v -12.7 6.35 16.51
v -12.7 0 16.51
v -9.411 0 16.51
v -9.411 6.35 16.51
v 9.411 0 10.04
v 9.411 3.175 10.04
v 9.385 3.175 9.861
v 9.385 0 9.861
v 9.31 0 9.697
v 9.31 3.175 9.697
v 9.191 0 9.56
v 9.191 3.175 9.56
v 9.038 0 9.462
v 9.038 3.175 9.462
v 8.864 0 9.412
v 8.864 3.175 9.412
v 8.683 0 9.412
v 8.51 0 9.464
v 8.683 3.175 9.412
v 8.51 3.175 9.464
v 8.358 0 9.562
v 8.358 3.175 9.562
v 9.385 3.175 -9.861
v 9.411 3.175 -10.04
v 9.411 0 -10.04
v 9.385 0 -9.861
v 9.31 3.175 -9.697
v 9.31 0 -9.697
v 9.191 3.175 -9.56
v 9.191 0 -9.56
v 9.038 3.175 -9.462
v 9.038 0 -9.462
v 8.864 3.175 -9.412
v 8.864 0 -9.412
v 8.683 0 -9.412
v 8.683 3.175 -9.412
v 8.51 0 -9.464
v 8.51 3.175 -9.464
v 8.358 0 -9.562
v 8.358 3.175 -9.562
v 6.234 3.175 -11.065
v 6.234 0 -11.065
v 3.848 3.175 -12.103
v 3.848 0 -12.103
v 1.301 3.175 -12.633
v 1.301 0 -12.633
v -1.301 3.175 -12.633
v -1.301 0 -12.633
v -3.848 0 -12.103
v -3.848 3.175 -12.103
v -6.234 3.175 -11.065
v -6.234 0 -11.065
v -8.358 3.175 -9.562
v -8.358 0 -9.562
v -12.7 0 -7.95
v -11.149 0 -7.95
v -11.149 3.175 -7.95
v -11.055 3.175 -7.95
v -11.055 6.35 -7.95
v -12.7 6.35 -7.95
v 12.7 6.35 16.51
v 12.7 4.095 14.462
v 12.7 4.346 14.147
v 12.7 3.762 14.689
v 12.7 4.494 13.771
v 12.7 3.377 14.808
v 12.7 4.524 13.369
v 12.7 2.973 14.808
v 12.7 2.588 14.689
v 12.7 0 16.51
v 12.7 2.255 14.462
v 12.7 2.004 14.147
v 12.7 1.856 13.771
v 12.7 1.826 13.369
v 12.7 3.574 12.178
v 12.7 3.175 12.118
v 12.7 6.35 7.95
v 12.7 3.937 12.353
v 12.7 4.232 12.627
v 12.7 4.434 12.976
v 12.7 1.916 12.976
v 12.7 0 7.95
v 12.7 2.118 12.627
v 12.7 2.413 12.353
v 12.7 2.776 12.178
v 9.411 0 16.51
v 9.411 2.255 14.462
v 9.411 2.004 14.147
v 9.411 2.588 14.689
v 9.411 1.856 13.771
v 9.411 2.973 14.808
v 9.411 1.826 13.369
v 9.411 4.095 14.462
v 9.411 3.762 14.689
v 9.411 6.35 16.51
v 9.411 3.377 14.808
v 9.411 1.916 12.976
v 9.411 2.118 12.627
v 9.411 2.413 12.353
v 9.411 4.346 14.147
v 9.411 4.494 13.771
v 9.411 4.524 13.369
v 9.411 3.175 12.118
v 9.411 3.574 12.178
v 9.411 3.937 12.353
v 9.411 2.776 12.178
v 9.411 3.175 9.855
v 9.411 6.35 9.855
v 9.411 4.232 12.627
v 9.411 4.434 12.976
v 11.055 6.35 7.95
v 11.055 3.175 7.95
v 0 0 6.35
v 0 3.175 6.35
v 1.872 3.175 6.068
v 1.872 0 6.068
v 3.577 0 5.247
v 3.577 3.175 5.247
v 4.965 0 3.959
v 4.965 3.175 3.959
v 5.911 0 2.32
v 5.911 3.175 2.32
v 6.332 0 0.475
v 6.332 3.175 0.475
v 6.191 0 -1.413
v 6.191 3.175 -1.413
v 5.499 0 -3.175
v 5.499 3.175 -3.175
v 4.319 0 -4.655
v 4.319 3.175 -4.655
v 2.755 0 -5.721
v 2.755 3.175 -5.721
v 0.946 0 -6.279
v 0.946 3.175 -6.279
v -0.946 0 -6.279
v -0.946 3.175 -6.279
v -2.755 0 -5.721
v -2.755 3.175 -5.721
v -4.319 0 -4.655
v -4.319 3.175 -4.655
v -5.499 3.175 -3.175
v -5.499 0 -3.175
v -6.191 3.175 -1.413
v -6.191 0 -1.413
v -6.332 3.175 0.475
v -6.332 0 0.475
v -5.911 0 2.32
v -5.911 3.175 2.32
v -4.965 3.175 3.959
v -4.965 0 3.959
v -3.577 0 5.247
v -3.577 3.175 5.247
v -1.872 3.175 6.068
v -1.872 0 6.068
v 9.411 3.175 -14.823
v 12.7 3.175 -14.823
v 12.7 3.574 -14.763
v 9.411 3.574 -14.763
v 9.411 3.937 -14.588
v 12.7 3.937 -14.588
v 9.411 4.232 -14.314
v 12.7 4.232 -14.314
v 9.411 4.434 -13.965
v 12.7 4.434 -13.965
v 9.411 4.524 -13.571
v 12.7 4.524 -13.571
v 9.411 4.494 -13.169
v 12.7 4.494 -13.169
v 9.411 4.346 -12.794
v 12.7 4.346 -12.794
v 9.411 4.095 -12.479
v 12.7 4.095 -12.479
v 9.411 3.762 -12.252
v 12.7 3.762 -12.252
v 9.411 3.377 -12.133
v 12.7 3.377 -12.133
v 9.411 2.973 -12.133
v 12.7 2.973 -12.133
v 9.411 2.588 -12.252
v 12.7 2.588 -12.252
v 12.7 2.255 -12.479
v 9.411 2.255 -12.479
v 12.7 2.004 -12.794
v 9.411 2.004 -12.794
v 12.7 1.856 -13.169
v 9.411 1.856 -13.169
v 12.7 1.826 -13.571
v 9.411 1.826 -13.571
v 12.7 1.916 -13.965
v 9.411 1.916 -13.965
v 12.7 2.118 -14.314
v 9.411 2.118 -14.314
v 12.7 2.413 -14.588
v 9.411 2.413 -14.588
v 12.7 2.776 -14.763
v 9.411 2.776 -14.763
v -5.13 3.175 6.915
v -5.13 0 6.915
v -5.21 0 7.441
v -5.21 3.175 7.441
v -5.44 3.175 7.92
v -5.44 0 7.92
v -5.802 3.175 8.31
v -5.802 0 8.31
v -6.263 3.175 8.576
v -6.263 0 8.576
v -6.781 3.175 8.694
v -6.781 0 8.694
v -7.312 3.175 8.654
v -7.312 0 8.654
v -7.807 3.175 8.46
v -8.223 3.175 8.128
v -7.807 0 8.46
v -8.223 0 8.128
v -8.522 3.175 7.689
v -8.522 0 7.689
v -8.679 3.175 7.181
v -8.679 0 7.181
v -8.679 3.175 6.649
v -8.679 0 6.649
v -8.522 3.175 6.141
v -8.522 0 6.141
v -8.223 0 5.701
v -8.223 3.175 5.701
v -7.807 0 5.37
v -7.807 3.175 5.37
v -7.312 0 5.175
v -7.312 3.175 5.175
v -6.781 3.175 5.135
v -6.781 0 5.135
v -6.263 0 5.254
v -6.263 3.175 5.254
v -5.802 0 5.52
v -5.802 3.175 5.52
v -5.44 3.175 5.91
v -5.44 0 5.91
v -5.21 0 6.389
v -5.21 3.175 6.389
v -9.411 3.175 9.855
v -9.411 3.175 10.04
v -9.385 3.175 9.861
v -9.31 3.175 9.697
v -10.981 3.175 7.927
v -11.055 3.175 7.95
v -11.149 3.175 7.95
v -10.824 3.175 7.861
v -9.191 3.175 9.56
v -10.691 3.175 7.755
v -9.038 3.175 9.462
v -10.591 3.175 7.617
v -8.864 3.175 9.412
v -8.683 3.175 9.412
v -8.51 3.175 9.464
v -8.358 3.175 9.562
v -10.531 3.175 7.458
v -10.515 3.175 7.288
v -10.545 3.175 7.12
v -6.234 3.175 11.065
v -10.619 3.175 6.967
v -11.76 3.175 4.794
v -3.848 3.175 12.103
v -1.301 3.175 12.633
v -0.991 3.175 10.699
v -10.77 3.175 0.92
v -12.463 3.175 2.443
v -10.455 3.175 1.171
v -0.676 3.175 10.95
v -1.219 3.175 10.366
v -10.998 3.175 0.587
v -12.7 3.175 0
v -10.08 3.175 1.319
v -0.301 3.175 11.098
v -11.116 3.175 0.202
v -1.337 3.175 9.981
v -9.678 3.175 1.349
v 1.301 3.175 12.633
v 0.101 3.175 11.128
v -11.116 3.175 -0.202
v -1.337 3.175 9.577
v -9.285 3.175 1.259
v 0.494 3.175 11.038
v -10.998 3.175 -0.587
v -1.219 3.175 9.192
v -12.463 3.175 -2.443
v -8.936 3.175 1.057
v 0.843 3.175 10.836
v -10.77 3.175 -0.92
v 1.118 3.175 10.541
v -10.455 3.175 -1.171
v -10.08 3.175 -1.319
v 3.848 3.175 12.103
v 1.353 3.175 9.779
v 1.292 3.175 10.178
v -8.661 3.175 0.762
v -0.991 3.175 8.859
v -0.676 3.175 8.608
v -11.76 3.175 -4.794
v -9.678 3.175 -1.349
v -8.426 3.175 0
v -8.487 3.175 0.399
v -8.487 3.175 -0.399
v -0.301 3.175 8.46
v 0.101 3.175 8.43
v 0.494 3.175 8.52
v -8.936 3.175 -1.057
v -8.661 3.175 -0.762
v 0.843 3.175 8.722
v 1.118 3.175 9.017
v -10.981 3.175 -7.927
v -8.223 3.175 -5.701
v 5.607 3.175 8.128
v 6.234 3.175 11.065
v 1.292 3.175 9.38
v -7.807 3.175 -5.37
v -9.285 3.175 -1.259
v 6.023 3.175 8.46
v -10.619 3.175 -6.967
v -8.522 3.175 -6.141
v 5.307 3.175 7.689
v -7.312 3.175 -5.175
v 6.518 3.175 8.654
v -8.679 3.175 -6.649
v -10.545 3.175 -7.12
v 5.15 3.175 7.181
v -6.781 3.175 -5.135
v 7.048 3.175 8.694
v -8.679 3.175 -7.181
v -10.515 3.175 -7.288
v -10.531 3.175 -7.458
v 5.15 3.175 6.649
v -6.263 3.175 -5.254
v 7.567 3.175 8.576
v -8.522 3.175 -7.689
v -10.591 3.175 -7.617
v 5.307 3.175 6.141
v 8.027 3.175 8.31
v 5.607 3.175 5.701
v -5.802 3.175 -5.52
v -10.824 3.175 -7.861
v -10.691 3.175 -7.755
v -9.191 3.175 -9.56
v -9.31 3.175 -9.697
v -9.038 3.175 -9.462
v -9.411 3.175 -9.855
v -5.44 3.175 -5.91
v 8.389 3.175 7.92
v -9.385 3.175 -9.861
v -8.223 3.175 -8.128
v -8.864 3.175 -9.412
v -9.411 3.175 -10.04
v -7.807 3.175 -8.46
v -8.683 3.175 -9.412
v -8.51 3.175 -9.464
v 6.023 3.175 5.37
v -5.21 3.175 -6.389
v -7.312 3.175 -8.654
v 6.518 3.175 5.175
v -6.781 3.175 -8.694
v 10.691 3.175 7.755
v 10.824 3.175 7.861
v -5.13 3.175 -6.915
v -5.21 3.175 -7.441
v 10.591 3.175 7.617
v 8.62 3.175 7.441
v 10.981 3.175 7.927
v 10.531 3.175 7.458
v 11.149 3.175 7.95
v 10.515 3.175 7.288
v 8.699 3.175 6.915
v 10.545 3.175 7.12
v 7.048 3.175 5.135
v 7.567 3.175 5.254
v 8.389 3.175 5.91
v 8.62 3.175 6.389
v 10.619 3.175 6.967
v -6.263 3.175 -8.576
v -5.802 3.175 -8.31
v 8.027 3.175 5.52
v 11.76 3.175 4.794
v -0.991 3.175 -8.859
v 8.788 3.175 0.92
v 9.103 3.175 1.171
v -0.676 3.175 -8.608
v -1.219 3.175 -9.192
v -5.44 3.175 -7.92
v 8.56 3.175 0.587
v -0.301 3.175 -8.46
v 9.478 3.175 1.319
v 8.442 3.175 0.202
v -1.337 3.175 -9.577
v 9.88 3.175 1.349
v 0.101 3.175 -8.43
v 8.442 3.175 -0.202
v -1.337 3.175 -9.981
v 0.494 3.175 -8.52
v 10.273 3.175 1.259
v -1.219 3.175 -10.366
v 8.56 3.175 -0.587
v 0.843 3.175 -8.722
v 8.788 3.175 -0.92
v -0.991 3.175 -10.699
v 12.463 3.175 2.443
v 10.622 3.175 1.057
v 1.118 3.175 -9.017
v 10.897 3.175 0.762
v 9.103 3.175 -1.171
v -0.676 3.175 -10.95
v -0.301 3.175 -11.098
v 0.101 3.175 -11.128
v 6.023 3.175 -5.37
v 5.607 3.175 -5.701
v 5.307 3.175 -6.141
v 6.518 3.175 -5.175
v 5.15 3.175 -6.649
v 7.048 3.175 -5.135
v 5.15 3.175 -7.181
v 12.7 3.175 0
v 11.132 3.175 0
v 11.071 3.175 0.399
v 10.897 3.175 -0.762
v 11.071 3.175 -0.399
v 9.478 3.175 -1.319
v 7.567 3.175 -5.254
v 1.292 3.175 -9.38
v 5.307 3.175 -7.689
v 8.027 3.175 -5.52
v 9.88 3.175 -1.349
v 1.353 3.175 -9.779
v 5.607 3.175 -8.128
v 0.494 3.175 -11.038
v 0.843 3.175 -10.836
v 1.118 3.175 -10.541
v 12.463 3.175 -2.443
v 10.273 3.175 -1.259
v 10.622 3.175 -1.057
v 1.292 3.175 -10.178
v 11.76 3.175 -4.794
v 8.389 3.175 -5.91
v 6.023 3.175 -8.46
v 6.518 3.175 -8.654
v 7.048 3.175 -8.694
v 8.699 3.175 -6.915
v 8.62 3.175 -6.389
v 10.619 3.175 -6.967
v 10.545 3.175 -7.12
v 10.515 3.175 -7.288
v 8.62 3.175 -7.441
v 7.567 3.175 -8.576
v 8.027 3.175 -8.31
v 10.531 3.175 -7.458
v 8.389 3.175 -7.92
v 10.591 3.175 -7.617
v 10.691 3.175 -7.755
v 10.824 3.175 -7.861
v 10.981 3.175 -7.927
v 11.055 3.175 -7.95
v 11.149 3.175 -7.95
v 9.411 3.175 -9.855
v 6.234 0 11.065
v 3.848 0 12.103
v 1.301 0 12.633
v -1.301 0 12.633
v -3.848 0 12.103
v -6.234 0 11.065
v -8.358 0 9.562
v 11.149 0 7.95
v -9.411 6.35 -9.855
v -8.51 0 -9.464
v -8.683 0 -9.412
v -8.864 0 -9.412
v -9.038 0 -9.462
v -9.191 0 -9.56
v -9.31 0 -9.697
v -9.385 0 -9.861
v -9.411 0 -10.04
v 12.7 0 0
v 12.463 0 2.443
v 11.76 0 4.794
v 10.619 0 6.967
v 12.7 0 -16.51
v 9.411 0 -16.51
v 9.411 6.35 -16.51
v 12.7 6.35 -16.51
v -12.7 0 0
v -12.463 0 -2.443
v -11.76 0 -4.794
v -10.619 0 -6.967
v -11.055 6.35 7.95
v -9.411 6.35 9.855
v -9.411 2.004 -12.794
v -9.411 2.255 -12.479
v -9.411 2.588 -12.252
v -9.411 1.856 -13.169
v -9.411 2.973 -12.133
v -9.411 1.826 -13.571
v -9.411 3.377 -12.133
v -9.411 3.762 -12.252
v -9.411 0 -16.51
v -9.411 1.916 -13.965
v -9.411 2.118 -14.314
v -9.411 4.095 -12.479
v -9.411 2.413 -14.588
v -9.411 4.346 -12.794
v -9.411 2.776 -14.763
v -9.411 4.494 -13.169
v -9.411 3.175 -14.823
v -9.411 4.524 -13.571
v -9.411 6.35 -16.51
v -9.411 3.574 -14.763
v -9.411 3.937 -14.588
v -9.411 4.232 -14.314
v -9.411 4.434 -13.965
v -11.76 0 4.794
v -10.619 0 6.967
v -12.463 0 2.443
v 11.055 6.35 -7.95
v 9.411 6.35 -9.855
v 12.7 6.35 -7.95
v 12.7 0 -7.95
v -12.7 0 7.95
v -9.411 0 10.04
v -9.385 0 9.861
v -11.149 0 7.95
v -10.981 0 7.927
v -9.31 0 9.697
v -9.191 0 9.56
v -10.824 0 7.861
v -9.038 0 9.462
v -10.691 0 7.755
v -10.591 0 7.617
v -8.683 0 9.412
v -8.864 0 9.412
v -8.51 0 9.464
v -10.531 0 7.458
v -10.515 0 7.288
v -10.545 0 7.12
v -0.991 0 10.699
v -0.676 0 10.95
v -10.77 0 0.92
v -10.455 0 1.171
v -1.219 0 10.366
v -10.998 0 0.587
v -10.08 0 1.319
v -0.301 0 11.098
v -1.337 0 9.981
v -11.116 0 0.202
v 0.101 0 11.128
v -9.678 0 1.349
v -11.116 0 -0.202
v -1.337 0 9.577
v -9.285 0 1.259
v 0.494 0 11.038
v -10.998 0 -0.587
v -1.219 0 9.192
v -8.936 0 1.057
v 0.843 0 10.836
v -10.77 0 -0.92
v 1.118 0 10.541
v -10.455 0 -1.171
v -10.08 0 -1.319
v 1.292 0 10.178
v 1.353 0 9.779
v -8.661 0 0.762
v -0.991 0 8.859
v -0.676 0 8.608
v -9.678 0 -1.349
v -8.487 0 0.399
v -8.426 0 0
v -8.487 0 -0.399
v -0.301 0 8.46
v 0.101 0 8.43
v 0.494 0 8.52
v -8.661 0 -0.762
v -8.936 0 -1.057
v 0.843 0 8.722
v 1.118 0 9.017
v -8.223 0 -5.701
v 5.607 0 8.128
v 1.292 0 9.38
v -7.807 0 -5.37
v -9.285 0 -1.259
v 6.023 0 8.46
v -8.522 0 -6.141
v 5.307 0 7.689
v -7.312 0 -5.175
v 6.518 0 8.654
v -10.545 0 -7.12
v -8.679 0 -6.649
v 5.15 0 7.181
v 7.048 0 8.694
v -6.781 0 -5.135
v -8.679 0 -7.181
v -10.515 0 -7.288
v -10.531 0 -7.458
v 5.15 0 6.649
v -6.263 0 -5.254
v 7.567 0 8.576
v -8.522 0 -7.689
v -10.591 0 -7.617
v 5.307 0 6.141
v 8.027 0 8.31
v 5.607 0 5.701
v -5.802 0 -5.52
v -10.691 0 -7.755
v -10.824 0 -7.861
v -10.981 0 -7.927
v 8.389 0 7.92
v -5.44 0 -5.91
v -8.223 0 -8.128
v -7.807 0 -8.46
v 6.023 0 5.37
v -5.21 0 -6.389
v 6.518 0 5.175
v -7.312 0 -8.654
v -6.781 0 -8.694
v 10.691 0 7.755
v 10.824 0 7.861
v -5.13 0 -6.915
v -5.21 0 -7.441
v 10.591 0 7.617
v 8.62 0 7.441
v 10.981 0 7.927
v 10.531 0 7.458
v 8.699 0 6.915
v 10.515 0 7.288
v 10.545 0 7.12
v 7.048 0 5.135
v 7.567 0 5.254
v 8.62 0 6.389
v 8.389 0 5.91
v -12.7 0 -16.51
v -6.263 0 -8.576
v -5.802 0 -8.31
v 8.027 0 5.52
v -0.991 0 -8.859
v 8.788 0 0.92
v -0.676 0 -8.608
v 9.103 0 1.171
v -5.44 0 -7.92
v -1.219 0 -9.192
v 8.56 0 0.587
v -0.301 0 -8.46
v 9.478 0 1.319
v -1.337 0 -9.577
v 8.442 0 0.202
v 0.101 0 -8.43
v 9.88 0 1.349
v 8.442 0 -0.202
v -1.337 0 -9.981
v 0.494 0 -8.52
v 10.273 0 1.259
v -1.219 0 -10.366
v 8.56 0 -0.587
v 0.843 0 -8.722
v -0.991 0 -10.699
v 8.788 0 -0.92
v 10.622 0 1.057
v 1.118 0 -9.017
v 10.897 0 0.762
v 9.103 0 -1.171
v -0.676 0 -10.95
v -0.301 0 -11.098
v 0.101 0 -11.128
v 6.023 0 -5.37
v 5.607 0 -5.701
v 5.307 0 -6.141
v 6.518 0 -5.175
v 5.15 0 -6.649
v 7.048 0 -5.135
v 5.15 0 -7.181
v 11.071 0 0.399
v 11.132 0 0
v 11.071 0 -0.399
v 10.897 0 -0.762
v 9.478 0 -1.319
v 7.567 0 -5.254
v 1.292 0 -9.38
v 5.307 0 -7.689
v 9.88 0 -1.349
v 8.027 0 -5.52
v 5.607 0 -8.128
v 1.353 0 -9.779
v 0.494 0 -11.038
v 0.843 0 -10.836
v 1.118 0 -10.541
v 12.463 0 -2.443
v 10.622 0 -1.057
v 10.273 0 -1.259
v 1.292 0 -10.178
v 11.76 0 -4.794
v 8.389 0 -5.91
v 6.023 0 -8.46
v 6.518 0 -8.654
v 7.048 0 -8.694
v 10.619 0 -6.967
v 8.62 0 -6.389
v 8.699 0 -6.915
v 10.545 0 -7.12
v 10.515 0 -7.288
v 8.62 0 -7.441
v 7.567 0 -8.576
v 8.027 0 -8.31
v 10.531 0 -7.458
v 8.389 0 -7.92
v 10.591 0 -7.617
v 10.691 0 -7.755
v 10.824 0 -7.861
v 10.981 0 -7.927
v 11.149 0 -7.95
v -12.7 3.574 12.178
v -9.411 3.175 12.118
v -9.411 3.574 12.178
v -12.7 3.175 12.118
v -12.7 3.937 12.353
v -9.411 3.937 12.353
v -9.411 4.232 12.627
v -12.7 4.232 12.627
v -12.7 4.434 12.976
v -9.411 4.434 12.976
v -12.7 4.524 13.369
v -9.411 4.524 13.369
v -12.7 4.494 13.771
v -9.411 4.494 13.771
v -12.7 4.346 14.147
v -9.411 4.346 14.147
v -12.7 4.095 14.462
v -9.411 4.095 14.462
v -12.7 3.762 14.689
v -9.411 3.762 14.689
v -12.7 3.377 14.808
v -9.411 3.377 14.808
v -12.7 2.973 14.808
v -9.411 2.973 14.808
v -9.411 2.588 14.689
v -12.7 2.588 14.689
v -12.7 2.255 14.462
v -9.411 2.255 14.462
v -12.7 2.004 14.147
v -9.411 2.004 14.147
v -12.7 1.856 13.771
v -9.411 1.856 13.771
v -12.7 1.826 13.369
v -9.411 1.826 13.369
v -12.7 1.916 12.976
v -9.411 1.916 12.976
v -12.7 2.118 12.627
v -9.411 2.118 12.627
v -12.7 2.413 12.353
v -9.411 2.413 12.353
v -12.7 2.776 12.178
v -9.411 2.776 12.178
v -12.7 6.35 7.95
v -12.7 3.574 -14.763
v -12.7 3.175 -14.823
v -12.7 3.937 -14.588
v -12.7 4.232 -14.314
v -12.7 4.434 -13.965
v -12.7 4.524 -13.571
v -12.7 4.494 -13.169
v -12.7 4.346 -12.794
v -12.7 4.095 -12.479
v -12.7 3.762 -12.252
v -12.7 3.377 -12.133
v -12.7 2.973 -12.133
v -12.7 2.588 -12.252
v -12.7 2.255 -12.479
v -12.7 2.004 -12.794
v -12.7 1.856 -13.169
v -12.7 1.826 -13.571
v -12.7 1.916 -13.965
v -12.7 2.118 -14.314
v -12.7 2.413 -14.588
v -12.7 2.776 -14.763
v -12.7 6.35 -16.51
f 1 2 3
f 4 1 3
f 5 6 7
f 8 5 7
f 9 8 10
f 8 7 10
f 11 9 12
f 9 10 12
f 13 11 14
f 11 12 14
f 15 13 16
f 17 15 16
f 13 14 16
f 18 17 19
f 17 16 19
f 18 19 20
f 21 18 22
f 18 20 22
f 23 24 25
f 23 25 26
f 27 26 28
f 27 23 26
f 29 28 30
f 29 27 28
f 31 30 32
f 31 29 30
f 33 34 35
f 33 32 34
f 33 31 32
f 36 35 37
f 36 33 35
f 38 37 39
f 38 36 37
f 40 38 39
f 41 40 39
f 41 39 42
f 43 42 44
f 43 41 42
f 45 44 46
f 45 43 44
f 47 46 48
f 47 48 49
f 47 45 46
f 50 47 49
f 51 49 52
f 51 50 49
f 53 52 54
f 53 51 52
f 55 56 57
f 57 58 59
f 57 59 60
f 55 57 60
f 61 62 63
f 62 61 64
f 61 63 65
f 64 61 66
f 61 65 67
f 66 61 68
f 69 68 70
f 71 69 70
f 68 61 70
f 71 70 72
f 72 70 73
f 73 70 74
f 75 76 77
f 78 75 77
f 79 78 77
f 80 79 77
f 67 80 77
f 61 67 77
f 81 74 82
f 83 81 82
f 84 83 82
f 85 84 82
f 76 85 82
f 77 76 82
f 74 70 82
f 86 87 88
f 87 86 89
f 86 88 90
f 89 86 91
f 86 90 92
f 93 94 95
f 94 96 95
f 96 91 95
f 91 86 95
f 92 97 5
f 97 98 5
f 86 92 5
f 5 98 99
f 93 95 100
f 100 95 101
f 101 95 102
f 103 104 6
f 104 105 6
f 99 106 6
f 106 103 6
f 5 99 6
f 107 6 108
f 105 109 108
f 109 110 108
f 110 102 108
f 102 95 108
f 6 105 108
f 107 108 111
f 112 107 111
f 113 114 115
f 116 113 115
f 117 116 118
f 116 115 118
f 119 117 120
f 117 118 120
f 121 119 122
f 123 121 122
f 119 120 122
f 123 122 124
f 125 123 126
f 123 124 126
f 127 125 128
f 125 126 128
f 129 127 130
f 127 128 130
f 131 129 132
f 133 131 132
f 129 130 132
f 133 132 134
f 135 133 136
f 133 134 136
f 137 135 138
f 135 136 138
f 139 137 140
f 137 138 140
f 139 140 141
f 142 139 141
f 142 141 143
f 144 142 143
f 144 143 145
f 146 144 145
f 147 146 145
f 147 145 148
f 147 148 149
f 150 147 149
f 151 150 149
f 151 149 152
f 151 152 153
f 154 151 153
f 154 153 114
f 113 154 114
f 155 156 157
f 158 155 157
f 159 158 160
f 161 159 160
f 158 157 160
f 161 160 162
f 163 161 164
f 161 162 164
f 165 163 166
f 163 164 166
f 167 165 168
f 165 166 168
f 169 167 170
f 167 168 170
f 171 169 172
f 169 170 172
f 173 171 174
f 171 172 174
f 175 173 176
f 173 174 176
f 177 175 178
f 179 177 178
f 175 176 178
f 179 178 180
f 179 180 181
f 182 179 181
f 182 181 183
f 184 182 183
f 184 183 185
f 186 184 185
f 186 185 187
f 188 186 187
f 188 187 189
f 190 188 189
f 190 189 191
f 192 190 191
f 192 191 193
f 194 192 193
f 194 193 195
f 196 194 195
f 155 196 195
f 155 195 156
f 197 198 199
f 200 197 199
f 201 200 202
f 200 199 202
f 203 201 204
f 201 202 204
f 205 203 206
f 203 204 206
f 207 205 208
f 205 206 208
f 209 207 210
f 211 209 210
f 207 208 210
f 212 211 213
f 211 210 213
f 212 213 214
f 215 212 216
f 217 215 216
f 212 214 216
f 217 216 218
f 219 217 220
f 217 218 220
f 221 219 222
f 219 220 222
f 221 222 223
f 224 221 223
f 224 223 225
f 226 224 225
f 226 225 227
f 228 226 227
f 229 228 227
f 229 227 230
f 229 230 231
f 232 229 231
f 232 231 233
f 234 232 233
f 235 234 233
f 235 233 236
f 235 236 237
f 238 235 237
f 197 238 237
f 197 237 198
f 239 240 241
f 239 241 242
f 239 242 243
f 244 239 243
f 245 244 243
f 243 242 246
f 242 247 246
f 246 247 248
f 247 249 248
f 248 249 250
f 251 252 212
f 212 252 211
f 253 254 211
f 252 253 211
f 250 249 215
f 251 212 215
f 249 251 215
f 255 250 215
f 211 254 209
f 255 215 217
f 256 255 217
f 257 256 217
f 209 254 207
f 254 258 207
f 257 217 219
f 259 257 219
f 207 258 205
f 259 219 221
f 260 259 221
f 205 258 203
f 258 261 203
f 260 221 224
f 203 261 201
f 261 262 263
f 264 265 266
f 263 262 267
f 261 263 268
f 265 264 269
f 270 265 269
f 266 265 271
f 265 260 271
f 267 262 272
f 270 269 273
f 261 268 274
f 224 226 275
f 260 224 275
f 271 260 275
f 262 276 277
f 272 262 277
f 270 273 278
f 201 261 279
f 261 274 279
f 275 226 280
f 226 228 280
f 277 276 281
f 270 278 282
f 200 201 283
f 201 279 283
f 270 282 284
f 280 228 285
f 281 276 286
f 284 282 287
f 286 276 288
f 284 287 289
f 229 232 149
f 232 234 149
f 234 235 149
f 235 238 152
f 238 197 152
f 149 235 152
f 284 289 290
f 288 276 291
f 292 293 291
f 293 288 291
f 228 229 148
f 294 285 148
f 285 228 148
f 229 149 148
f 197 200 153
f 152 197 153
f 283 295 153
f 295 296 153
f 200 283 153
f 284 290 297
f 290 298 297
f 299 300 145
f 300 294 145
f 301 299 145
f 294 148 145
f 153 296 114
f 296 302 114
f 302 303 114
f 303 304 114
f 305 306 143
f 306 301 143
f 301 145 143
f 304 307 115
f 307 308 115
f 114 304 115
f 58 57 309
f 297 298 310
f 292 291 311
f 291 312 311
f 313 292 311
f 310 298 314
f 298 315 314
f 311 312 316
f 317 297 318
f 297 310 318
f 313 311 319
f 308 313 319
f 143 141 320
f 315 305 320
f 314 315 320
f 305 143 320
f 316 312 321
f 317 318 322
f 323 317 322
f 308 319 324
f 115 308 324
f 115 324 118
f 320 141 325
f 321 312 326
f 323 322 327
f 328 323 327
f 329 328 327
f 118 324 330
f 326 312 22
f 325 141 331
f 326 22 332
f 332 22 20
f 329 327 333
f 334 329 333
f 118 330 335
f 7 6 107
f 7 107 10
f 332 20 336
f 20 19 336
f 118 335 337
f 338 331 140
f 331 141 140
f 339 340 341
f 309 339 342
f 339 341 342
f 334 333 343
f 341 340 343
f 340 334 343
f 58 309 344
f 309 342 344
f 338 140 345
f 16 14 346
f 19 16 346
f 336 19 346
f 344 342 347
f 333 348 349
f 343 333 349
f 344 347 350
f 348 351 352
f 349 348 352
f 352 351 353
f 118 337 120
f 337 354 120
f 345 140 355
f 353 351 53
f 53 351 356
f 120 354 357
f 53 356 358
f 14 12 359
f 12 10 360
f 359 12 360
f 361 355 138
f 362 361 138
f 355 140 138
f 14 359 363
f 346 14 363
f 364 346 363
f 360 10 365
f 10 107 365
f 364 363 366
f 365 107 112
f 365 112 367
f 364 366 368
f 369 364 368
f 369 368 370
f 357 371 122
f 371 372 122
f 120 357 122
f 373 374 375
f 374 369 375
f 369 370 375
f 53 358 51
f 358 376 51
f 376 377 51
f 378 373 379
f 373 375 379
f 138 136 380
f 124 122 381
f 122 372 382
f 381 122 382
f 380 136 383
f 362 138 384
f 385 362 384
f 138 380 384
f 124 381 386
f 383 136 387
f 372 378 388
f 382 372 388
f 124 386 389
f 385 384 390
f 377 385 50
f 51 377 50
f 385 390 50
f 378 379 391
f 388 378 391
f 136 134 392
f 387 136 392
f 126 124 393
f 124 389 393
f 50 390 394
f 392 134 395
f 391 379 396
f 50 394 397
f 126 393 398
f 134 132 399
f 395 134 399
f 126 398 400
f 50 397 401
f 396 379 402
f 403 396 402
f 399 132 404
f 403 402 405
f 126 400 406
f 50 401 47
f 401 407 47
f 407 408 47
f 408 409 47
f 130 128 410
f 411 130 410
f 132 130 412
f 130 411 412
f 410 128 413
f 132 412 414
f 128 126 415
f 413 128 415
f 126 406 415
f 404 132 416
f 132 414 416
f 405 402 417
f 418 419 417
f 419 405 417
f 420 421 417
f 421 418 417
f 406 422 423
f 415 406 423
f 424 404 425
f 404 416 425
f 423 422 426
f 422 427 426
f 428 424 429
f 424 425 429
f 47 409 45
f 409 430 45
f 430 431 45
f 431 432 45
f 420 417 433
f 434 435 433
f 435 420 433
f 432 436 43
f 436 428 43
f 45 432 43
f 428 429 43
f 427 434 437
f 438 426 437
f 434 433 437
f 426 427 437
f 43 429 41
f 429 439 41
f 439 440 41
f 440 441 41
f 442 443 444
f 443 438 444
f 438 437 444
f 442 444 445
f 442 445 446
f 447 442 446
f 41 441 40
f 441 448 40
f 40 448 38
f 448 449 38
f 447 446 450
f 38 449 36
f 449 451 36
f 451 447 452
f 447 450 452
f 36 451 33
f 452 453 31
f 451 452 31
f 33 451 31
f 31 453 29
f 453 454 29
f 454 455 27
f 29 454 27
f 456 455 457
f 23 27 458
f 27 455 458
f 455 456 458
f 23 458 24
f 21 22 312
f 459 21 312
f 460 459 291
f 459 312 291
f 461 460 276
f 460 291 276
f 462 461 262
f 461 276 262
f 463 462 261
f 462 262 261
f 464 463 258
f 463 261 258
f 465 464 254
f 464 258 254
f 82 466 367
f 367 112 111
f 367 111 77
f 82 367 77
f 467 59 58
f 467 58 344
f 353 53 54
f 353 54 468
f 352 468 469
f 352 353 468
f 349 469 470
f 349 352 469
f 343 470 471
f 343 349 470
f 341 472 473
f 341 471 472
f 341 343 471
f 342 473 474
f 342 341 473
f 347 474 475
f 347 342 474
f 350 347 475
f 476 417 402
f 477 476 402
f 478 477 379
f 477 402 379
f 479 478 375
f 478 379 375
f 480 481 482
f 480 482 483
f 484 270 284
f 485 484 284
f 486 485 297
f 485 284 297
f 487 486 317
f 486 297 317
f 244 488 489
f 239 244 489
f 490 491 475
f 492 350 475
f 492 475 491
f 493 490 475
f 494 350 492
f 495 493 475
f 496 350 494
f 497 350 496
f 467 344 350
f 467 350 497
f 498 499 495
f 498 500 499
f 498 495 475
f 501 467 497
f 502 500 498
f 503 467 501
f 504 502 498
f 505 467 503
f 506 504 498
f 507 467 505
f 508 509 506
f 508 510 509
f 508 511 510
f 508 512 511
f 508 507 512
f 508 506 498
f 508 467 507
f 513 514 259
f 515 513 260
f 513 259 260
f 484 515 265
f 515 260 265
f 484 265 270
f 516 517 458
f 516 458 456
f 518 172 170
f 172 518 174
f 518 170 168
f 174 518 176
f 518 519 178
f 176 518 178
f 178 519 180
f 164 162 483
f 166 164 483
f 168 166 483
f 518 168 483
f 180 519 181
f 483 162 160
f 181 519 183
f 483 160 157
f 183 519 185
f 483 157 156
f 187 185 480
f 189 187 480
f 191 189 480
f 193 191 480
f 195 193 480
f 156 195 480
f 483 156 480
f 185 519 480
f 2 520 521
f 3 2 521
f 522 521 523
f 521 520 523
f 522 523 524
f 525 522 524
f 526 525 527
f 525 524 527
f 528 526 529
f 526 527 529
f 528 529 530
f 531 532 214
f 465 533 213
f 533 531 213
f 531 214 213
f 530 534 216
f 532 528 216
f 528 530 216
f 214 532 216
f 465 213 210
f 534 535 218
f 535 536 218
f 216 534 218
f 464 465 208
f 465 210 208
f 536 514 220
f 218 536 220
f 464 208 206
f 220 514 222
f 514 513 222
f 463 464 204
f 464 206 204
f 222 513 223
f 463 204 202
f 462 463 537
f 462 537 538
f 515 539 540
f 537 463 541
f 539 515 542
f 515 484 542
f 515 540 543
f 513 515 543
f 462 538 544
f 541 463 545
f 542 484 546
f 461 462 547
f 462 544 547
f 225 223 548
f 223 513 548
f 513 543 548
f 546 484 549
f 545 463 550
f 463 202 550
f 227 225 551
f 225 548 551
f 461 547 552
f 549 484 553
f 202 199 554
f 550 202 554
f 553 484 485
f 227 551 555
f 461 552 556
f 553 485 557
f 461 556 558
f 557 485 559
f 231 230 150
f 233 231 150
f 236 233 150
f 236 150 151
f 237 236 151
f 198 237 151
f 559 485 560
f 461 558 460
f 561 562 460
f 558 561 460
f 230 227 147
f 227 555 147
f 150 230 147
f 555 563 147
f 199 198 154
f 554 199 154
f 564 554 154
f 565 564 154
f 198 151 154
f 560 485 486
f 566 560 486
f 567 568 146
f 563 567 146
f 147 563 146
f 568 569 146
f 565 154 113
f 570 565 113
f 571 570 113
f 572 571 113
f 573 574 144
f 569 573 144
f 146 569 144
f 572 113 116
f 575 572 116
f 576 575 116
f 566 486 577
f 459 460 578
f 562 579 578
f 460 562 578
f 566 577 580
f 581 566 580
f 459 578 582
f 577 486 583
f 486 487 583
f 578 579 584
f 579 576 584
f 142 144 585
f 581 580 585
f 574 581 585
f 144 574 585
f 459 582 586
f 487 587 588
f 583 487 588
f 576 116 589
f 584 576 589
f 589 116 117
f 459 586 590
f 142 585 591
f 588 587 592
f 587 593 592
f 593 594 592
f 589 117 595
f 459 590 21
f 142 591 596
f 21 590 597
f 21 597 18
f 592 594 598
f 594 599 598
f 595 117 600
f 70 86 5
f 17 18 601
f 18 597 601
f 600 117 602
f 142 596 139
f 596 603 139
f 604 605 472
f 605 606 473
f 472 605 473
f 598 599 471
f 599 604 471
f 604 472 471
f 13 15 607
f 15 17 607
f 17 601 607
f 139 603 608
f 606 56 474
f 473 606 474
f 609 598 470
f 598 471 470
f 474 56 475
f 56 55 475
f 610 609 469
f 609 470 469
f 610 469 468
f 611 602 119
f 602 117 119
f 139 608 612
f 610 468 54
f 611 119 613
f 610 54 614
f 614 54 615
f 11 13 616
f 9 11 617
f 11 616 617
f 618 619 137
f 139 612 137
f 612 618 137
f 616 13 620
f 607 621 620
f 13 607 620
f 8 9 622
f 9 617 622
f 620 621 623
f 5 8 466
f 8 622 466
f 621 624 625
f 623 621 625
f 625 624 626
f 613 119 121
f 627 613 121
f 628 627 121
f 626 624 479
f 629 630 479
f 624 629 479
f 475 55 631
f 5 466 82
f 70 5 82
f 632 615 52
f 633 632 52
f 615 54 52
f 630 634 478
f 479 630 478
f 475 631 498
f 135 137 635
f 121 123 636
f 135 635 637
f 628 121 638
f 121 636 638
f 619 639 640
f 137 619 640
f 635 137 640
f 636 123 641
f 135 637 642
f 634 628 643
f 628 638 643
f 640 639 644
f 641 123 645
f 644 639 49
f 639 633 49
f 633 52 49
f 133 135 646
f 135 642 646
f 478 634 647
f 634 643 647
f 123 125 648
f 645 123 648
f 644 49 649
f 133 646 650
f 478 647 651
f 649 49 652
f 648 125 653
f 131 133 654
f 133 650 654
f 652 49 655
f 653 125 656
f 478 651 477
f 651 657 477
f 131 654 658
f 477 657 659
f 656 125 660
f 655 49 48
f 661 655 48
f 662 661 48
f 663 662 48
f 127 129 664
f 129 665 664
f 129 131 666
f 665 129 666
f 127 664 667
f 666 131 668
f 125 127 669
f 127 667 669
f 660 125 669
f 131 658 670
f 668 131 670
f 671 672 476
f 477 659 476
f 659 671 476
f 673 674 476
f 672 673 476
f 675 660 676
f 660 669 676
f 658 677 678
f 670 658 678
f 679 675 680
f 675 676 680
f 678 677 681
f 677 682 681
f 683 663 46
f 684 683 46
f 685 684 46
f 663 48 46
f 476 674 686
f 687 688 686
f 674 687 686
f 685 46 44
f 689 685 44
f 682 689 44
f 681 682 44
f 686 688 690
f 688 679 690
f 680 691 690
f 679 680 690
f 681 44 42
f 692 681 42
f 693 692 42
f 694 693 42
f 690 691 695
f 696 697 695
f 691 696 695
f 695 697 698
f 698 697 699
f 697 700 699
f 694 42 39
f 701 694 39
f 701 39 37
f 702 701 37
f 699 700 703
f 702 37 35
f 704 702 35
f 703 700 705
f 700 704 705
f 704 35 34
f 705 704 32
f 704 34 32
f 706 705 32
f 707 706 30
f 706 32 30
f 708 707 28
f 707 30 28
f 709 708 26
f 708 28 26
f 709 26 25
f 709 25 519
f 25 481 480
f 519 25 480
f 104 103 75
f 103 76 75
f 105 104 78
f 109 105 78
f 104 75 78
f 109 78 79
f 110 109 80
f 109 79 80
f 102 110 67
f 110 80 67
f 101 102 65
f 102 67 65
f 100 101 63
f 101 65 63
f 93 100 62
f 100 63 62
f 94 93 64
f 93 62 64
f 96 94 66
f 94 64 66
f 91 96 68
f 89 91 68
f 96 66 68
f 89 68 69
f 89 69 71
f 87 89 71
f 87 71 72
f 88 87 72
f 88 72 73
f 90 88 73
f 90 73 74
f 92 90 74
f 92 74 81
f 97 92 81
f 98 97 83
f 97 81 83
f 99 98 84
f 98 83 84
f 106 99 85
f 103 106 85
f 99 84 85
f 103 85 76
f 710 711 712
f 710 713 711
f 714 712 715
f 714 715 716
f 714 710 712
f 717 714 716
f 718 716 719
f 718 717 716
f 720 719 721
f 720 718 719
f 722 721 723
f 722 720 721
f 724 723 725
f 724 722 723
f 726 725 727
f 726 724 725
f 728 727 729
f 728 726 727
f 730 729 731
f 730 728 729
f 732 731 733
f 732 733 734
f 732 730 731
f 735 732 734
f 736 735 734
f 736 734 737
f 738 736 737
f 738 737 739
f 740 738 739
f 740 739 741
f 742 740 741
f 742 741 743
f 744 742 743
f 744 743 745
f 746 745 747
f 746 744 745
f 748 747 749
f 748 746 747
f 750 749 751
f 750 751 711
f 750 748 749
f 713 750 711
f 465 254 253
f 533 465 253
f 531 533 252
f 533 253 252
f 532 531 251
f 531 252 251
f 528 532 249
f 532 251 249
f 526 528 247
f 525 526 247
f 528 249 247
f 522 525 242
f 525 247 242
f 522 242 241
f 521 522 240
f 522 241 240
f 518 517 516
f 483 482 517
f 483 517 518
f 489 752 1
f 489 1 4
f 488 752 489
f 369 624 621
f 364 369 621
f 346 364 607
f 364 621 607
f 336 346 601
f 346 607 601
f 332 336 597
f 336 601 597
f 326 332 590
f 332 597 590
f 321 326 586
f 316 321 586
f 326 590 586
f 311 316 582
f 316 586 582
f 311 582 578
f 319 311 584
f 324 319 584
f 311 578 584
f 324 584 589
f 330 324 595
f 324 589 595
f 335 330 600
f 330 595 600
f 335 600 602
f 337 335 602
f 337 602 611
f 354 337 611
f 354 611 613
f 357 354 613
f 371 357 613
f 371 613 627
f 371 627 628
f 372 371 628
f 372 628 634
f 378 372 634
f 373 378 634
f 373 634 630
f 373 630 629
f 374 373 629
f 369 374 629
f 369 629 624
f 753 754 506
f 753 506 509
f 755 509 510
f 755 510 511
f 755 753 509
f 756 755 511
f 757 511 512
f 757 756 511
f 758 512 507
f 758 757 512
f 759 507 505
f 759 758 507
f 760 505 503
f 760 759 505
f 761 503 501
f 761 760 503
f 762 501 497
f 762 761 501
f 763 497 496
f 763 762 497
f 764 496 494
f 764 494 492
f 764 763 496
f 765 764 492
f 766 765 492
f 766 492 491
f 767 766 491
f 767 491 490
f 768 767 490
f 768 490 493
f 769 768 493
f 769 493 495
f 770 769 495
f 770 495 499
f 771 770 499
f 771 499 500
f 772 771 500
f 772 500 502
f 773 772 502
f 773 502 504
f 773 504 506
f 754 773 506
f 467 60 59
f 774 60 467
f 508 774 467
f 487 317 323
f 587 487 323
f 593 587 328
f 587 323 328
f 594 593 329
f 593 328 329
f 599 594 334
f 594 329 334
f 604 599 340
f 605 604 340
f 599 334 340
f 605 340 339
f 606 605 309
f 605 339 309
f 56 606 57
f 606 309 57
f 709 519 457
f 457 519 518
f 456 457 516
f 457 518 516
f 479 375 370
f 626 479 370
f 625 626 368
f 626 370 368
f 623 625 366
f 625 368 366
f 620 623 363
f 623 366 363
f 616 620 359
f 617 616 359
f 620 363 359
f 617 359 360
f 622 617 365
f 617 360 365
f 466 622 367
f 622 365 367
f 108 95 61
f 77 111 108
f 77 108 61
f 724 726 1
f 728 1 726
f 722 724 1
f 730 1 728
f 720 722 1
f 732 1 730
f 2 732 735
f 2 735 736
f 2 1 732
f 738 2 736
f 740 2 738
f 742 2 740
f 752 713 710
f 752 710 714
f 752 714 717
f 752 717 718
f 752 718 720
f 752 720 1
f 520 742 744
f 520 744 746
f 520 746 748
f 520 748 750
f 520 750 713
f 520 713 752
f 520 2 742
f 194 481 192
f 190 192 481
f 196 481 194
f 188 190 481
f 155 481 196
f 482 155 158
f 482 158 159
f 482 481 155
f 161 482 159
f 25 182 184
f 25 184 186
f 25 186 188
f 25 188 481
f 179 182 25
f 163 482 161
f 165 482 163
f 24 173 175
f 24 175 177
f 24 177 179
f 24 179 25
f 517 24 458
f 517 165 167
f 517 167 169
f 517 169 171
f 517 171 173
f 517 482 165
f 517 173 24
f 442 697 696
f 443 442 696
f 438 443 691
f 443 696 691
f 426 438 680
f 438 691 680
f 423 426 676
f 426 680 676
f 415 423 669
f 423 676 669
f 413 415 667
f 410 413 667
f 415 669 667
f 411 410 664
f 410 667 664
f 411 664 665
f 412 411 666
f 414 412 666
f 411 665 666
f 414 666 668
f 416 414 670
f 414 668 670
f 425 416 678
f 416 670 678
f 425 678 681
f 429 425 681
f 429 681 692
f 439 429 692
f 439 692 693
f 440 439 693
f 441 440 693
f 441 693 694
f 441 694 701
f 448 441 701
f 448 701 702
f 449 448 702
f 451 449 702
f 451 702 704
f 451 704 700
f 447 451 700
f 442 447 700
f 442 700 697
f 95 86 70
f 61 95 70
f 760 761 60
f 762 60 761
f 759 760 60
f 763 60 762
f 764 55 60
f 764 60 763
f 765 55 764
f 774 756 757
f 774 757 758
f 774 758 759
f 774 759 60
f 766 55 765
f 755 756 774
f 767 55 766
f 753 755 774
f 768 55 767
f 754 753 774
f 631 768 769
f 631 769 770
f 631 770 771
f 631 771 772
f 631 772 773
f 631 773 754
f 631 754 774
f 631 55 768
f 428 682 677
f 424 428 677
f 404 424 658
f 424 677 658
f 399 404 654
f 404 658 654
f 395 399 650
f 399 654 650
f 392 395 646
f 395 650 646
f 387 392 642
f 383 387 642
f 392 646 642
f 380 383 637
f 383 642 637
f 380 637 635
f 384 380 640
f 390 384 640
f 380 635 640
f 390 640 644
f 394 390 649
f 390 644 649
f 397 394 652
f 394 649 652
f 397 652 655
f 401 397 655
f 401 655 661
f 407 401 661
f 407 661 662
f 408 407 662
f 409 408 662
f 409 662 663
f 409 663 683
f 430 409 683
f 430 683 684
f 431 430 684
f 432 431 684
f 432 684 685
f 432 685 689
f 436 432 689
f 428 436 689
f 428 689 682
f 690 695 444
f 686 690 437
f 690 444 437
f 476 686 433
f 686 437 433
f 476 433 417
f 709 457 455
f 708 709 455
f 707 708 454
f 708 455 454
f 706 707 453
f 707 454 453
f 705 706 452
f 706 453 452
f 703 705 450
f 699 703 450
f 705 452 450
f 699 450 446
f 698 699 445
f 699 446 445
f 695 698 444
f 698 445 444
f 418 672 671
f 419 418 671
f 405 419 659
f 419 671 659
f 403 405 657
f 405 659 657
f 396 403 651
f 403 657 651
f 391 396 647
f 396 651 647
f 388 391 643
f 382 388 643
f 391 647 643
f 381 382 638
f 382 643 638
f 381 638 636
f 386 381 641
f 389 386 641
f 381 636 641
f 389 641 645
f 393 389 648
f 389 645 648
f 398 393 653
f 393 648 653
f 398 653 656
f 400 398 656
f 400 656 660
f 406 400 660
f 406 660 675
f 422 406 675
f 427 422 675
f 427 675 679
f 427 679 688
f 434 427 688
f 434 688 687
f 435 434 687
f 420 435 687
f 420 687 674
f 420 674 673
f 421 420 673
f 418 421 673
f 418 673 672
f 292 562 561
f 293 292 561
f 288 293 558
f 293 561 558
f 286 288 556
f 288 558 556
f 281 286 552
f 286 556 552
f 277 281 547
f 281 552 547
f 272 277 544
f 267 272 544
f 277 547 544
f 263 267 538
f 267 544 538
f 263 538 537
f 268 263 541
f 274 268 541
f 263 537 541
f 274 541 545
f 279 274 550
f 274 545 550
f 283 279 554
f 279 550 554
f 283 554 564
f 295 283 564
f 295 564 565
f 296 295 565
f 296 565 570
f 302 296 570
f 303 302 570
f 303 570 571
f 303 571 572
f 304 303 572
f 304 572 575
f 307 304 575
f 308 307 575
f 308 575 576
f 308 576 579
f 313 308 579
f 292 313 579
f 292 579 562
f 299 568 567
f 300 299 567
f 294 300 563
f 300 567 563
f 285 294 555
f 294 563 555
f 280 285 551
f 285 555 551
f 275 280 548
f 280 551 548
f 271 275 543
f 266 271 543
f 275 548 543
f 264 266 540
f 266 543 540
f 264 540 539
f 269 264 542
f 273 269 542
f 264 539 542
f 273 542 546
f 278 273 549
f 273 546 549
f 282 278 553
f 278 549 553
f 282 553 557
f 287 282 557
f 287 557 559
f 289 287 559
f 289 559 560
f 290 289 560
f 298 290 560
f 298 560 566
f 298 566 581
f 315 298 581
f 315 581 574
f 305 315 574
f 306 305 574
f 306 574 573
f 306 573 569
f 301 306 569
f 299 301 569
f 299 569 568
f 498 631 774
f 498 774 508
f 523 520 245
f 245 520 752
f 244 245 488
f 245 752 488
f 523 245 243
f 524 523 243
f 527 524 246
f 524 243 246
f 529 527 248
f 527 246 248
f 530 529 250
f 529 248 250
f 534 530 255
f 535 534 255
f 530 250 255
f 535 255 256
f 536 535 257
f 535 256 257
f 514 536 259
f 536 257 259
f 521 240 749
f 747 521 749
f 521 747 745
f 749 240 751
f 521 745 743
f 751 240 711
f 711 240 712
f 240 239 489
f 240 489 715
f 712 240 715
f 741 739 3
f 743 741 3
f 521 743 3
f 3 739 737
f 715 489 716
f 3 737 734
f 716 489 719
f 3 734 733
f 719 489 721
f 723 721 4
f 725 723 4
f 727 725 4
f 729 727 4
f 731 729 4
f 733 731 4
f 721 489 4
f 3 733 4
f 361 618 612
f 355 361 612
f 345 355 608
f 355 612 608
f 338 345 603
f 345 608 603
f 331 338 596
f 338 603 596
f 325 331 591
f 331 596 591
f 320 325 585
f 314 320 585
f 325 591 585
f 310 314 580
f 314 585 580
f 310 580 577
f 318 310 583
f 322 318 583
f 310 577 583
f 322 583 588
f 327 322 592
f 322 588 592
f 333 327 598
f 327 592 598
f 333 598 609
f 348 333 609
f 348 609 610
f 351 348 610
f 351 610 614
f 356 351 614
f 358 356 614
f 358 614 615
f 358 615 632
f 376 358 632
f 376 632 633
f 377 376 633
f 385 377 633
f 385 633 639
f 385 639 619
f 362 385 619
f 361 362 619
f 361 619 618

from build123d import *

# Parameters (mm, degrees)
SKETCH1_W                    = 25.4
SKETCH1_H                    = 33.02
BOSS_EXTRUDE1_DEPTH          = 6.35
CUT_EXTRUDE1_REACH           = 37.943
SKETCH2_W                    = 18.8214
SKETCH2_H                    = 3.175
SKETCH3_W                    = 15.9004
SKETCH3_H                    = 3.175
CUT_EXTRUDE2_DEPTH           = 31.952586322
CUT_EXTRUDE3_REACH           = 23.07
SKETCH4_R                    = 6.35
CUT_EXTRUDE4_REACH           = 23.07
CUT_EXTRUDE5_REACH           = 23.07
CUT_EXTRUDE6_DEPTH           = 3.175
F_6_32_TAPPED_HOLE1_D        = 2.7051
F_28_0_1405_DIAMETER_HOLE1_D = 3.5687
F_6_32_TAPPED_HOLE2_REACH    = 32.953
F_6_32_TAPPED_HOLE2_BORE_R   = 1.35255


with BuildPart() as part:
    # Sketch1 → Boss-Extrude1 (new body)
    with BuildSketch(Plane(origin=(0, 0, 0), x_dir=(1, 0, 0), z_dir=(0, 1, 0))):
        Rectangle(SKETCH1_W, SKETCH1_H)
    extrude(amount=BOSS_EXTRUDE1_DEPTH)

    # Sketch2 → Cut-Extrude1 (cut, up to next)
    with BuildSketch(Plane.XY.offset(16.51), mode=Mode.PRIVATE) as cut_extrude1_sk1:
        with Locations((0, 4.7625)):
            Rectangle(SKETCH2_W, SKETCH2_H)
    cut_extrude1_tool1 = extrude(cut_extrude1_sk1.sketch, amount=-CUT_EXTRUDE1_REACH, mode=Mode.PRIVATE) & part.part
    add(cut_extrude1_tool1.solids().sort_by_distance((0, 4.7625, 16.51))[0], mode=Mode.SUBTRACT)

    # Sketch3 → Cut-Extrude2 (cut, through all)
    with BuildSketch(Plane(origin=(12.7, 0, 0), x_dir=(0, 0, -1), z_dir=(1, 0, 0))):
        with Locations((0, 4.7625)):
            Rectangle(SKETCH3_W, SKETCH3_H)
    extrude(amount=-CUT_EXTRUDE2_DEPTH, mode=Mode.SUBTRACT)

    # Sketch4 → Cut-Extrude3 (cut, up to next)
    with BuildSketch(Plane(origin=(0, 3.175, 0), x_dir=(1, 0, 0), z_dir=(0, 1, 0)), mode=Mode.PRIVATE) as cut_extrude3_sk1:
        with Locations(Location((0, 0, 0), (0, 0, 270))):
            Circle(SKETCH4_R)
    cut_extrude3_tool1 = extrude(cut_extrude3_sk1.sketch, amount=-CUT_EXTRUDE3_REACH, mode=Mode.PRIVATE) & part.part
    add(cut_extrude3_tool1.solids().sort_by_distance((0, 3.175, 0))[0], mode=Mode.SUBTRACT)

    # Sketch5 → Cut-Extrude4 (cut, up to next)
    with BuildSketch(Plane(origin=(0, 3.175, 0), x_dir=(-1, 0, 0), z_dir=(0, 1, 0)), mode=Mode.PRIVATE) as cut_extrude4_sk1:
        with BuildLine():
            Line((11.149442765, -7.9502), (12.7, -7.9502))
            Line((12.7, -7.9502), (12.7, 0))
            ThreePointArc((12.7, 0), (12.168507815, -3.635576648), (10.618516919, -6.966857143))
            ThreePointArc((10.618516919, -6.966857143), (10.590684, -7.616884675), (11.149442765, -7.9502))
        make_face()
    cut_extrude4_tool1 = extrude(cut_extrude4_sk1.sketch, amount=-CUT_EXTRUDE4_REACH, mode=Mode.PRIVATE) & part.part
    # Sketch5 → Cut-Extrude4 (cut, up to next)
    with BuildSketch(Plane(origin=(0, 3.175, 0), x_dir=(-1, 0, 0), z_dir=(0, 1, 0)), mode=Mode.PRIVATE) as cut_extrude4_sk2:
        with BuildLine():
            ThreePointArc((10.618516919, 6.966857143), (12.168507815, 3.635576648), (12.7, 0))
            Line((12.7, 0), (12.7, 7.9502))
            Line((12.7, 7.9502), (11.149442765, 7.9502))
            ThreePointArc((11.149442765, 7.9502), (10.590684, 7.616884675), (10.618516919, 6.966857143))
        make_face()
    cut_extrude4_tool2 = extrude(cut_extrude4_sk2.sketch, amount=-CUT_EXTRUDE4_REACH, mode=Mode.PRIVATE) & part.part
    # Sketch5 → Cut-Extrude4 (cut, up to next)
    with BuildSketch(Plane(origin=(0, 3.175, 0), x_dir=(-1, 0, 0), z_dir=(0, 1, 0)), mode=Mode.PRIVATE) as cut_extrude4_sk3:
        with BuildLine():
            ThreePointArc((-10.618516919, -6.966857143), (-12.168507815, -3.635576648), (-12.7, 0))
            Line((-12.7, 0), (-12.7, -7.9502))
            Line((-12.7, -7.9502), (-11.149442765, -7.9502))
            ThreePointArc((-11.149442765, -7.9502), (-10.590684, -7.616884675), (-10.618516919, -6.966857143))
        make_face()
    cut_extrude4_tool3 = extrude(cut_extrude4_sk3.sketch, amount=-CUT_EXTRUDE4_REACH, mode=Mode.PRIVATE) & part.part
    # Sketch5 → Cut-Extrude4 (cut, up to next)
    with BuildSketch(Plane(origin=(0, 3.175, 0), x_dir=(-1, 0, 0), z_dir=(0, 1, 0)), mode=Mode.PRIVATE) as cut_extrude4_sk4:
        with BuildLine():
            Line((-12.7, 7.9502), (-12.7, 0))
            ThreePointArc((-12.7, 0), (-12.168507815, 3.635576648), (-10.618516919, 6.966857143))
            ThreePointArc((-10.618516919, 6.966857143), (-10.590684, 7.616884675), (-11.149442765, 7.9502))
            Line((-11.149442765, 7.9502), (-12.7, 7.9502))
        make_face()
    cut_extrude4_tool4 = extrude(cut_extrude4_sk4.sketch, amount=-CUT_EXTRUDE4_REACH, mode=Mode.PRIVATE) & part.part
    add(cut_extrude4_tool1.solids().sort_by_distance((-11.953453, 3.175, -5.924274))[0], mode=Mode.SUBTRACT)
    add(cut_extrude4_tool2.solids().sort_by_distance((-11.953453, 3.175, 5.924274))[0], mode=Mode.SUBTRACT)
    add(cut_extrude4_tool3.solids().sort_by_distance((11.953453, 3.175, -5.924274))[0], mode=Mode.SUBTRACT)
    add(cut_extrude4_tool4.solids().sort_by_distance((11.953453, 3.175, 5.924274))[0], mode=Mode.SUBTRACT)

    # Sketch6 → Cut-Extrude5 (cut, up to next)
    with BuildSketch(Plane(origin=(0, 3.175, 0), x_dir=(1, 0, 0), z_dir=(0, 1, 0)), mode=Mode.PRIVATE) as cut_extrude5_sk1:
        with BuildLine():
            Line((-9.4107, -10.040384181), (-9.4107, -16.51))
            Line((-9.4107, -16.51), (9.4107, -16.51))
            Line((9.4107, -16.51), (9.4107, -10.040384181))
            ThreePointArc((9.4107, -10.040384181), (9.038249564, -9.462203651), (8.357809524, -9.562270649))
            ThreePointArc((8.357809524, -9.562270649), (0, -12.7), (-8.357809524, -9.562270649))
            ThreePointArc((-8.357809524, -9.562270649), (-9.038249564, -9.462203651), (-9.4107, -10.040384181))
        make_face()
    cut_extrude5_tool1 = extrude(cut_extrude5_sk1.sketch, amount=-CUT_EXTRUDE5_REACH, mode=Mode.PRIVATE) & part.part
    # Sketch6 → Cut-Extrude5 (cut, up to next)
    with BuildSketch(Plane(origin=(0, 3.175, 0), x_dir=(1, 0, 0), z_dir=(0, 1, 0)), mode=Mode.PRIVATE) as cut_extrude5_sk2:
        with BuildLine():
            Line((9.4107, 16.51), (9.4107, 10.040384181))
            ThreePointArc((9.4107, 10.040384181), (9.038249564, 9.462203651), (8.357809524, 9.562270649))
            ThreePointArc((8.357809524, 9.562270649), (0, 12.7), (-8.357809524, 9.562270649))
            ThreePointArc((-8.357809524, 9.562270649), (-9.038249564, 9.462203651), (-9.4107, 10.040384181))
            Line((-9.4107, 10.040384181), (-9.4107, 16.51))
            Line((-9.4107, 16.51), (9.4107, 16.51))
        make_face()
    cut_extrude5_tool2 = extrude(cut_extrude5_sk2.sketch, amount=-CUT_EXTRUDE5_REACH, mode=Mode.PRIVATE) & part.part
    add(cut_extrude5_tool1.solids().sort_by_distance((0, 3.175, 13.865951))[0], mode=Mode.SUBTRACT)
    add(cut_extrude5_tool2.solids().sort_by_distance((0, 3.175, -13.865951))[0], mode=Mode.SUBTRACT)

    # Sketch7 → Cut-Extrude6 (cut)
    with BuildSketch(Plane(origin=(0, 6.35, 0), x_dir=(1, 0, 0), z_dir=(0, 1, 0))):
        Polygon((-11.05535, 7.9502), (-9.4107, 9.8552), (-9.4107, 7.9502), align=None)
        Polygon((-11.05535, -7.9502), (-9.4107, -9.8552), (-9.4107, -7.9502), align=None)
        Polygon((9.4107, -9.8552), (11.05535, -7.9502), (9.4107, -7.9502), align=None)
        Polygon((9.4107, 9.8552), (11.05535, 7.9502), (9.4107, 7.9502), align=None)
    extrude(amount=-CUT_EXTRUDE6_DEPTH, mode=Mode.SUBTRACT)

    # #6-32 Tapped Hole1 (through all)
    with Locations(Plane(origin=(0, 3.175, 0), x_dir=(-1, 0, 0), z_dir=(0, 1, 0))):
        with Locations((0, -9.779), (-9.779, 0), (0, 9.779), (9.779, 0)):
            Hole(F_6_32_TAPPED_HOLE1_D / 2)

    # #28 (0.1405) Diameter Hole1 (through all)
    with Locations(Plane(origin=(0, 3.175, 0), x_dir=(-1, 0, 0), z_dir=(0, 1, 0))):
        with Locations((6.914797213, -6.914797213), (-6.914797213, -6.914797213), (-6.914797213, 6.914797213), (6.914797213, 6.914797213)):
            Hole(F_28_0_1405_DIAMETER_HOLE1_D / 2)

    # #6-32 Tapped Hole2 bore → #6-32 Tapped Hole2 (cut, up to next)
    with BuildSketch(Plane(origin=(12.7, 0, 0), x_dir=(0, 0, -1), z_dir=(1, 0, 0)), mode=Mode.PRIVATE) as f_6_32_tapped_hole2_sk1:
        with Locations((-13.470384182, 3.175)):
            Circle(F_6_32_TAPPED_HOLE2_BORE_R)
    f_6_32_tapped_hole2_tool1 = extrude(f_6_32_tapped_hole2_sk1.sketch, amount=-F_6_32_TAPPED_HOLE2_REACH, mode=Mode.PRIVATE) & part.part
    # #6-32 Tapped Hole2 bore → #6-32 Tapped Hole2 (cut, up to next)
    with BuildSketch(Plane(origin=(12.7, 0, 0), x_dir=(0, 0, -1), z_dir=(1, 0, 0)), mode=Mode.PRIVATE) as f_6_32_tapped_hole2_sk2:
        with Locations((13.470384182, 3.175)):
            Circle(F_6_32_TAPPED_HOLE2_BORE_R)
    f_6_32_tapped_hole2_tool2 = extrude(f_6_32_tapped_hole2_sk2.sketch, amount=-F_6_32_TAPPED_HOLE2_REACH, mode=Mode.PRIVATE) & part.part
    f_6_32_tapped_hole2_1 = f_6_32_tapped_hole2_tool1.solids().sort_by_distance((12.7, 3.175, 13.470384))[0]
    add(f_6_32_tapped_hole2_1, mode=Mode.SUBTRACT)
    f_6_32_tapped_hole2_2 = f_6_32_tapped_hole2_tool2.solids().sort_by_distance((12.7, 3.175, -13.470384))[0]
    add(f_6_32_tapped_hole2_2, mode=Mode.SUBTRACT)
    f_6_32_tapped_hole2 = f_6_32_tapped_hole2_1 + f_6_32_tapped_hole2_2  # #6-32 Tapped Hole2 as one shape, for the pattern or mirror that repeats it

    # Mirror1: #6-32 Tapped Hole2 across plane
    add(f_6_32_tapped_hole2.mirror(Plane(origin=(0, 0, 0), x_dir=(0, 0, 1), z_dir=(1, 0, 0))), mode=Mode.SUBTRACT)


solid = part.part
